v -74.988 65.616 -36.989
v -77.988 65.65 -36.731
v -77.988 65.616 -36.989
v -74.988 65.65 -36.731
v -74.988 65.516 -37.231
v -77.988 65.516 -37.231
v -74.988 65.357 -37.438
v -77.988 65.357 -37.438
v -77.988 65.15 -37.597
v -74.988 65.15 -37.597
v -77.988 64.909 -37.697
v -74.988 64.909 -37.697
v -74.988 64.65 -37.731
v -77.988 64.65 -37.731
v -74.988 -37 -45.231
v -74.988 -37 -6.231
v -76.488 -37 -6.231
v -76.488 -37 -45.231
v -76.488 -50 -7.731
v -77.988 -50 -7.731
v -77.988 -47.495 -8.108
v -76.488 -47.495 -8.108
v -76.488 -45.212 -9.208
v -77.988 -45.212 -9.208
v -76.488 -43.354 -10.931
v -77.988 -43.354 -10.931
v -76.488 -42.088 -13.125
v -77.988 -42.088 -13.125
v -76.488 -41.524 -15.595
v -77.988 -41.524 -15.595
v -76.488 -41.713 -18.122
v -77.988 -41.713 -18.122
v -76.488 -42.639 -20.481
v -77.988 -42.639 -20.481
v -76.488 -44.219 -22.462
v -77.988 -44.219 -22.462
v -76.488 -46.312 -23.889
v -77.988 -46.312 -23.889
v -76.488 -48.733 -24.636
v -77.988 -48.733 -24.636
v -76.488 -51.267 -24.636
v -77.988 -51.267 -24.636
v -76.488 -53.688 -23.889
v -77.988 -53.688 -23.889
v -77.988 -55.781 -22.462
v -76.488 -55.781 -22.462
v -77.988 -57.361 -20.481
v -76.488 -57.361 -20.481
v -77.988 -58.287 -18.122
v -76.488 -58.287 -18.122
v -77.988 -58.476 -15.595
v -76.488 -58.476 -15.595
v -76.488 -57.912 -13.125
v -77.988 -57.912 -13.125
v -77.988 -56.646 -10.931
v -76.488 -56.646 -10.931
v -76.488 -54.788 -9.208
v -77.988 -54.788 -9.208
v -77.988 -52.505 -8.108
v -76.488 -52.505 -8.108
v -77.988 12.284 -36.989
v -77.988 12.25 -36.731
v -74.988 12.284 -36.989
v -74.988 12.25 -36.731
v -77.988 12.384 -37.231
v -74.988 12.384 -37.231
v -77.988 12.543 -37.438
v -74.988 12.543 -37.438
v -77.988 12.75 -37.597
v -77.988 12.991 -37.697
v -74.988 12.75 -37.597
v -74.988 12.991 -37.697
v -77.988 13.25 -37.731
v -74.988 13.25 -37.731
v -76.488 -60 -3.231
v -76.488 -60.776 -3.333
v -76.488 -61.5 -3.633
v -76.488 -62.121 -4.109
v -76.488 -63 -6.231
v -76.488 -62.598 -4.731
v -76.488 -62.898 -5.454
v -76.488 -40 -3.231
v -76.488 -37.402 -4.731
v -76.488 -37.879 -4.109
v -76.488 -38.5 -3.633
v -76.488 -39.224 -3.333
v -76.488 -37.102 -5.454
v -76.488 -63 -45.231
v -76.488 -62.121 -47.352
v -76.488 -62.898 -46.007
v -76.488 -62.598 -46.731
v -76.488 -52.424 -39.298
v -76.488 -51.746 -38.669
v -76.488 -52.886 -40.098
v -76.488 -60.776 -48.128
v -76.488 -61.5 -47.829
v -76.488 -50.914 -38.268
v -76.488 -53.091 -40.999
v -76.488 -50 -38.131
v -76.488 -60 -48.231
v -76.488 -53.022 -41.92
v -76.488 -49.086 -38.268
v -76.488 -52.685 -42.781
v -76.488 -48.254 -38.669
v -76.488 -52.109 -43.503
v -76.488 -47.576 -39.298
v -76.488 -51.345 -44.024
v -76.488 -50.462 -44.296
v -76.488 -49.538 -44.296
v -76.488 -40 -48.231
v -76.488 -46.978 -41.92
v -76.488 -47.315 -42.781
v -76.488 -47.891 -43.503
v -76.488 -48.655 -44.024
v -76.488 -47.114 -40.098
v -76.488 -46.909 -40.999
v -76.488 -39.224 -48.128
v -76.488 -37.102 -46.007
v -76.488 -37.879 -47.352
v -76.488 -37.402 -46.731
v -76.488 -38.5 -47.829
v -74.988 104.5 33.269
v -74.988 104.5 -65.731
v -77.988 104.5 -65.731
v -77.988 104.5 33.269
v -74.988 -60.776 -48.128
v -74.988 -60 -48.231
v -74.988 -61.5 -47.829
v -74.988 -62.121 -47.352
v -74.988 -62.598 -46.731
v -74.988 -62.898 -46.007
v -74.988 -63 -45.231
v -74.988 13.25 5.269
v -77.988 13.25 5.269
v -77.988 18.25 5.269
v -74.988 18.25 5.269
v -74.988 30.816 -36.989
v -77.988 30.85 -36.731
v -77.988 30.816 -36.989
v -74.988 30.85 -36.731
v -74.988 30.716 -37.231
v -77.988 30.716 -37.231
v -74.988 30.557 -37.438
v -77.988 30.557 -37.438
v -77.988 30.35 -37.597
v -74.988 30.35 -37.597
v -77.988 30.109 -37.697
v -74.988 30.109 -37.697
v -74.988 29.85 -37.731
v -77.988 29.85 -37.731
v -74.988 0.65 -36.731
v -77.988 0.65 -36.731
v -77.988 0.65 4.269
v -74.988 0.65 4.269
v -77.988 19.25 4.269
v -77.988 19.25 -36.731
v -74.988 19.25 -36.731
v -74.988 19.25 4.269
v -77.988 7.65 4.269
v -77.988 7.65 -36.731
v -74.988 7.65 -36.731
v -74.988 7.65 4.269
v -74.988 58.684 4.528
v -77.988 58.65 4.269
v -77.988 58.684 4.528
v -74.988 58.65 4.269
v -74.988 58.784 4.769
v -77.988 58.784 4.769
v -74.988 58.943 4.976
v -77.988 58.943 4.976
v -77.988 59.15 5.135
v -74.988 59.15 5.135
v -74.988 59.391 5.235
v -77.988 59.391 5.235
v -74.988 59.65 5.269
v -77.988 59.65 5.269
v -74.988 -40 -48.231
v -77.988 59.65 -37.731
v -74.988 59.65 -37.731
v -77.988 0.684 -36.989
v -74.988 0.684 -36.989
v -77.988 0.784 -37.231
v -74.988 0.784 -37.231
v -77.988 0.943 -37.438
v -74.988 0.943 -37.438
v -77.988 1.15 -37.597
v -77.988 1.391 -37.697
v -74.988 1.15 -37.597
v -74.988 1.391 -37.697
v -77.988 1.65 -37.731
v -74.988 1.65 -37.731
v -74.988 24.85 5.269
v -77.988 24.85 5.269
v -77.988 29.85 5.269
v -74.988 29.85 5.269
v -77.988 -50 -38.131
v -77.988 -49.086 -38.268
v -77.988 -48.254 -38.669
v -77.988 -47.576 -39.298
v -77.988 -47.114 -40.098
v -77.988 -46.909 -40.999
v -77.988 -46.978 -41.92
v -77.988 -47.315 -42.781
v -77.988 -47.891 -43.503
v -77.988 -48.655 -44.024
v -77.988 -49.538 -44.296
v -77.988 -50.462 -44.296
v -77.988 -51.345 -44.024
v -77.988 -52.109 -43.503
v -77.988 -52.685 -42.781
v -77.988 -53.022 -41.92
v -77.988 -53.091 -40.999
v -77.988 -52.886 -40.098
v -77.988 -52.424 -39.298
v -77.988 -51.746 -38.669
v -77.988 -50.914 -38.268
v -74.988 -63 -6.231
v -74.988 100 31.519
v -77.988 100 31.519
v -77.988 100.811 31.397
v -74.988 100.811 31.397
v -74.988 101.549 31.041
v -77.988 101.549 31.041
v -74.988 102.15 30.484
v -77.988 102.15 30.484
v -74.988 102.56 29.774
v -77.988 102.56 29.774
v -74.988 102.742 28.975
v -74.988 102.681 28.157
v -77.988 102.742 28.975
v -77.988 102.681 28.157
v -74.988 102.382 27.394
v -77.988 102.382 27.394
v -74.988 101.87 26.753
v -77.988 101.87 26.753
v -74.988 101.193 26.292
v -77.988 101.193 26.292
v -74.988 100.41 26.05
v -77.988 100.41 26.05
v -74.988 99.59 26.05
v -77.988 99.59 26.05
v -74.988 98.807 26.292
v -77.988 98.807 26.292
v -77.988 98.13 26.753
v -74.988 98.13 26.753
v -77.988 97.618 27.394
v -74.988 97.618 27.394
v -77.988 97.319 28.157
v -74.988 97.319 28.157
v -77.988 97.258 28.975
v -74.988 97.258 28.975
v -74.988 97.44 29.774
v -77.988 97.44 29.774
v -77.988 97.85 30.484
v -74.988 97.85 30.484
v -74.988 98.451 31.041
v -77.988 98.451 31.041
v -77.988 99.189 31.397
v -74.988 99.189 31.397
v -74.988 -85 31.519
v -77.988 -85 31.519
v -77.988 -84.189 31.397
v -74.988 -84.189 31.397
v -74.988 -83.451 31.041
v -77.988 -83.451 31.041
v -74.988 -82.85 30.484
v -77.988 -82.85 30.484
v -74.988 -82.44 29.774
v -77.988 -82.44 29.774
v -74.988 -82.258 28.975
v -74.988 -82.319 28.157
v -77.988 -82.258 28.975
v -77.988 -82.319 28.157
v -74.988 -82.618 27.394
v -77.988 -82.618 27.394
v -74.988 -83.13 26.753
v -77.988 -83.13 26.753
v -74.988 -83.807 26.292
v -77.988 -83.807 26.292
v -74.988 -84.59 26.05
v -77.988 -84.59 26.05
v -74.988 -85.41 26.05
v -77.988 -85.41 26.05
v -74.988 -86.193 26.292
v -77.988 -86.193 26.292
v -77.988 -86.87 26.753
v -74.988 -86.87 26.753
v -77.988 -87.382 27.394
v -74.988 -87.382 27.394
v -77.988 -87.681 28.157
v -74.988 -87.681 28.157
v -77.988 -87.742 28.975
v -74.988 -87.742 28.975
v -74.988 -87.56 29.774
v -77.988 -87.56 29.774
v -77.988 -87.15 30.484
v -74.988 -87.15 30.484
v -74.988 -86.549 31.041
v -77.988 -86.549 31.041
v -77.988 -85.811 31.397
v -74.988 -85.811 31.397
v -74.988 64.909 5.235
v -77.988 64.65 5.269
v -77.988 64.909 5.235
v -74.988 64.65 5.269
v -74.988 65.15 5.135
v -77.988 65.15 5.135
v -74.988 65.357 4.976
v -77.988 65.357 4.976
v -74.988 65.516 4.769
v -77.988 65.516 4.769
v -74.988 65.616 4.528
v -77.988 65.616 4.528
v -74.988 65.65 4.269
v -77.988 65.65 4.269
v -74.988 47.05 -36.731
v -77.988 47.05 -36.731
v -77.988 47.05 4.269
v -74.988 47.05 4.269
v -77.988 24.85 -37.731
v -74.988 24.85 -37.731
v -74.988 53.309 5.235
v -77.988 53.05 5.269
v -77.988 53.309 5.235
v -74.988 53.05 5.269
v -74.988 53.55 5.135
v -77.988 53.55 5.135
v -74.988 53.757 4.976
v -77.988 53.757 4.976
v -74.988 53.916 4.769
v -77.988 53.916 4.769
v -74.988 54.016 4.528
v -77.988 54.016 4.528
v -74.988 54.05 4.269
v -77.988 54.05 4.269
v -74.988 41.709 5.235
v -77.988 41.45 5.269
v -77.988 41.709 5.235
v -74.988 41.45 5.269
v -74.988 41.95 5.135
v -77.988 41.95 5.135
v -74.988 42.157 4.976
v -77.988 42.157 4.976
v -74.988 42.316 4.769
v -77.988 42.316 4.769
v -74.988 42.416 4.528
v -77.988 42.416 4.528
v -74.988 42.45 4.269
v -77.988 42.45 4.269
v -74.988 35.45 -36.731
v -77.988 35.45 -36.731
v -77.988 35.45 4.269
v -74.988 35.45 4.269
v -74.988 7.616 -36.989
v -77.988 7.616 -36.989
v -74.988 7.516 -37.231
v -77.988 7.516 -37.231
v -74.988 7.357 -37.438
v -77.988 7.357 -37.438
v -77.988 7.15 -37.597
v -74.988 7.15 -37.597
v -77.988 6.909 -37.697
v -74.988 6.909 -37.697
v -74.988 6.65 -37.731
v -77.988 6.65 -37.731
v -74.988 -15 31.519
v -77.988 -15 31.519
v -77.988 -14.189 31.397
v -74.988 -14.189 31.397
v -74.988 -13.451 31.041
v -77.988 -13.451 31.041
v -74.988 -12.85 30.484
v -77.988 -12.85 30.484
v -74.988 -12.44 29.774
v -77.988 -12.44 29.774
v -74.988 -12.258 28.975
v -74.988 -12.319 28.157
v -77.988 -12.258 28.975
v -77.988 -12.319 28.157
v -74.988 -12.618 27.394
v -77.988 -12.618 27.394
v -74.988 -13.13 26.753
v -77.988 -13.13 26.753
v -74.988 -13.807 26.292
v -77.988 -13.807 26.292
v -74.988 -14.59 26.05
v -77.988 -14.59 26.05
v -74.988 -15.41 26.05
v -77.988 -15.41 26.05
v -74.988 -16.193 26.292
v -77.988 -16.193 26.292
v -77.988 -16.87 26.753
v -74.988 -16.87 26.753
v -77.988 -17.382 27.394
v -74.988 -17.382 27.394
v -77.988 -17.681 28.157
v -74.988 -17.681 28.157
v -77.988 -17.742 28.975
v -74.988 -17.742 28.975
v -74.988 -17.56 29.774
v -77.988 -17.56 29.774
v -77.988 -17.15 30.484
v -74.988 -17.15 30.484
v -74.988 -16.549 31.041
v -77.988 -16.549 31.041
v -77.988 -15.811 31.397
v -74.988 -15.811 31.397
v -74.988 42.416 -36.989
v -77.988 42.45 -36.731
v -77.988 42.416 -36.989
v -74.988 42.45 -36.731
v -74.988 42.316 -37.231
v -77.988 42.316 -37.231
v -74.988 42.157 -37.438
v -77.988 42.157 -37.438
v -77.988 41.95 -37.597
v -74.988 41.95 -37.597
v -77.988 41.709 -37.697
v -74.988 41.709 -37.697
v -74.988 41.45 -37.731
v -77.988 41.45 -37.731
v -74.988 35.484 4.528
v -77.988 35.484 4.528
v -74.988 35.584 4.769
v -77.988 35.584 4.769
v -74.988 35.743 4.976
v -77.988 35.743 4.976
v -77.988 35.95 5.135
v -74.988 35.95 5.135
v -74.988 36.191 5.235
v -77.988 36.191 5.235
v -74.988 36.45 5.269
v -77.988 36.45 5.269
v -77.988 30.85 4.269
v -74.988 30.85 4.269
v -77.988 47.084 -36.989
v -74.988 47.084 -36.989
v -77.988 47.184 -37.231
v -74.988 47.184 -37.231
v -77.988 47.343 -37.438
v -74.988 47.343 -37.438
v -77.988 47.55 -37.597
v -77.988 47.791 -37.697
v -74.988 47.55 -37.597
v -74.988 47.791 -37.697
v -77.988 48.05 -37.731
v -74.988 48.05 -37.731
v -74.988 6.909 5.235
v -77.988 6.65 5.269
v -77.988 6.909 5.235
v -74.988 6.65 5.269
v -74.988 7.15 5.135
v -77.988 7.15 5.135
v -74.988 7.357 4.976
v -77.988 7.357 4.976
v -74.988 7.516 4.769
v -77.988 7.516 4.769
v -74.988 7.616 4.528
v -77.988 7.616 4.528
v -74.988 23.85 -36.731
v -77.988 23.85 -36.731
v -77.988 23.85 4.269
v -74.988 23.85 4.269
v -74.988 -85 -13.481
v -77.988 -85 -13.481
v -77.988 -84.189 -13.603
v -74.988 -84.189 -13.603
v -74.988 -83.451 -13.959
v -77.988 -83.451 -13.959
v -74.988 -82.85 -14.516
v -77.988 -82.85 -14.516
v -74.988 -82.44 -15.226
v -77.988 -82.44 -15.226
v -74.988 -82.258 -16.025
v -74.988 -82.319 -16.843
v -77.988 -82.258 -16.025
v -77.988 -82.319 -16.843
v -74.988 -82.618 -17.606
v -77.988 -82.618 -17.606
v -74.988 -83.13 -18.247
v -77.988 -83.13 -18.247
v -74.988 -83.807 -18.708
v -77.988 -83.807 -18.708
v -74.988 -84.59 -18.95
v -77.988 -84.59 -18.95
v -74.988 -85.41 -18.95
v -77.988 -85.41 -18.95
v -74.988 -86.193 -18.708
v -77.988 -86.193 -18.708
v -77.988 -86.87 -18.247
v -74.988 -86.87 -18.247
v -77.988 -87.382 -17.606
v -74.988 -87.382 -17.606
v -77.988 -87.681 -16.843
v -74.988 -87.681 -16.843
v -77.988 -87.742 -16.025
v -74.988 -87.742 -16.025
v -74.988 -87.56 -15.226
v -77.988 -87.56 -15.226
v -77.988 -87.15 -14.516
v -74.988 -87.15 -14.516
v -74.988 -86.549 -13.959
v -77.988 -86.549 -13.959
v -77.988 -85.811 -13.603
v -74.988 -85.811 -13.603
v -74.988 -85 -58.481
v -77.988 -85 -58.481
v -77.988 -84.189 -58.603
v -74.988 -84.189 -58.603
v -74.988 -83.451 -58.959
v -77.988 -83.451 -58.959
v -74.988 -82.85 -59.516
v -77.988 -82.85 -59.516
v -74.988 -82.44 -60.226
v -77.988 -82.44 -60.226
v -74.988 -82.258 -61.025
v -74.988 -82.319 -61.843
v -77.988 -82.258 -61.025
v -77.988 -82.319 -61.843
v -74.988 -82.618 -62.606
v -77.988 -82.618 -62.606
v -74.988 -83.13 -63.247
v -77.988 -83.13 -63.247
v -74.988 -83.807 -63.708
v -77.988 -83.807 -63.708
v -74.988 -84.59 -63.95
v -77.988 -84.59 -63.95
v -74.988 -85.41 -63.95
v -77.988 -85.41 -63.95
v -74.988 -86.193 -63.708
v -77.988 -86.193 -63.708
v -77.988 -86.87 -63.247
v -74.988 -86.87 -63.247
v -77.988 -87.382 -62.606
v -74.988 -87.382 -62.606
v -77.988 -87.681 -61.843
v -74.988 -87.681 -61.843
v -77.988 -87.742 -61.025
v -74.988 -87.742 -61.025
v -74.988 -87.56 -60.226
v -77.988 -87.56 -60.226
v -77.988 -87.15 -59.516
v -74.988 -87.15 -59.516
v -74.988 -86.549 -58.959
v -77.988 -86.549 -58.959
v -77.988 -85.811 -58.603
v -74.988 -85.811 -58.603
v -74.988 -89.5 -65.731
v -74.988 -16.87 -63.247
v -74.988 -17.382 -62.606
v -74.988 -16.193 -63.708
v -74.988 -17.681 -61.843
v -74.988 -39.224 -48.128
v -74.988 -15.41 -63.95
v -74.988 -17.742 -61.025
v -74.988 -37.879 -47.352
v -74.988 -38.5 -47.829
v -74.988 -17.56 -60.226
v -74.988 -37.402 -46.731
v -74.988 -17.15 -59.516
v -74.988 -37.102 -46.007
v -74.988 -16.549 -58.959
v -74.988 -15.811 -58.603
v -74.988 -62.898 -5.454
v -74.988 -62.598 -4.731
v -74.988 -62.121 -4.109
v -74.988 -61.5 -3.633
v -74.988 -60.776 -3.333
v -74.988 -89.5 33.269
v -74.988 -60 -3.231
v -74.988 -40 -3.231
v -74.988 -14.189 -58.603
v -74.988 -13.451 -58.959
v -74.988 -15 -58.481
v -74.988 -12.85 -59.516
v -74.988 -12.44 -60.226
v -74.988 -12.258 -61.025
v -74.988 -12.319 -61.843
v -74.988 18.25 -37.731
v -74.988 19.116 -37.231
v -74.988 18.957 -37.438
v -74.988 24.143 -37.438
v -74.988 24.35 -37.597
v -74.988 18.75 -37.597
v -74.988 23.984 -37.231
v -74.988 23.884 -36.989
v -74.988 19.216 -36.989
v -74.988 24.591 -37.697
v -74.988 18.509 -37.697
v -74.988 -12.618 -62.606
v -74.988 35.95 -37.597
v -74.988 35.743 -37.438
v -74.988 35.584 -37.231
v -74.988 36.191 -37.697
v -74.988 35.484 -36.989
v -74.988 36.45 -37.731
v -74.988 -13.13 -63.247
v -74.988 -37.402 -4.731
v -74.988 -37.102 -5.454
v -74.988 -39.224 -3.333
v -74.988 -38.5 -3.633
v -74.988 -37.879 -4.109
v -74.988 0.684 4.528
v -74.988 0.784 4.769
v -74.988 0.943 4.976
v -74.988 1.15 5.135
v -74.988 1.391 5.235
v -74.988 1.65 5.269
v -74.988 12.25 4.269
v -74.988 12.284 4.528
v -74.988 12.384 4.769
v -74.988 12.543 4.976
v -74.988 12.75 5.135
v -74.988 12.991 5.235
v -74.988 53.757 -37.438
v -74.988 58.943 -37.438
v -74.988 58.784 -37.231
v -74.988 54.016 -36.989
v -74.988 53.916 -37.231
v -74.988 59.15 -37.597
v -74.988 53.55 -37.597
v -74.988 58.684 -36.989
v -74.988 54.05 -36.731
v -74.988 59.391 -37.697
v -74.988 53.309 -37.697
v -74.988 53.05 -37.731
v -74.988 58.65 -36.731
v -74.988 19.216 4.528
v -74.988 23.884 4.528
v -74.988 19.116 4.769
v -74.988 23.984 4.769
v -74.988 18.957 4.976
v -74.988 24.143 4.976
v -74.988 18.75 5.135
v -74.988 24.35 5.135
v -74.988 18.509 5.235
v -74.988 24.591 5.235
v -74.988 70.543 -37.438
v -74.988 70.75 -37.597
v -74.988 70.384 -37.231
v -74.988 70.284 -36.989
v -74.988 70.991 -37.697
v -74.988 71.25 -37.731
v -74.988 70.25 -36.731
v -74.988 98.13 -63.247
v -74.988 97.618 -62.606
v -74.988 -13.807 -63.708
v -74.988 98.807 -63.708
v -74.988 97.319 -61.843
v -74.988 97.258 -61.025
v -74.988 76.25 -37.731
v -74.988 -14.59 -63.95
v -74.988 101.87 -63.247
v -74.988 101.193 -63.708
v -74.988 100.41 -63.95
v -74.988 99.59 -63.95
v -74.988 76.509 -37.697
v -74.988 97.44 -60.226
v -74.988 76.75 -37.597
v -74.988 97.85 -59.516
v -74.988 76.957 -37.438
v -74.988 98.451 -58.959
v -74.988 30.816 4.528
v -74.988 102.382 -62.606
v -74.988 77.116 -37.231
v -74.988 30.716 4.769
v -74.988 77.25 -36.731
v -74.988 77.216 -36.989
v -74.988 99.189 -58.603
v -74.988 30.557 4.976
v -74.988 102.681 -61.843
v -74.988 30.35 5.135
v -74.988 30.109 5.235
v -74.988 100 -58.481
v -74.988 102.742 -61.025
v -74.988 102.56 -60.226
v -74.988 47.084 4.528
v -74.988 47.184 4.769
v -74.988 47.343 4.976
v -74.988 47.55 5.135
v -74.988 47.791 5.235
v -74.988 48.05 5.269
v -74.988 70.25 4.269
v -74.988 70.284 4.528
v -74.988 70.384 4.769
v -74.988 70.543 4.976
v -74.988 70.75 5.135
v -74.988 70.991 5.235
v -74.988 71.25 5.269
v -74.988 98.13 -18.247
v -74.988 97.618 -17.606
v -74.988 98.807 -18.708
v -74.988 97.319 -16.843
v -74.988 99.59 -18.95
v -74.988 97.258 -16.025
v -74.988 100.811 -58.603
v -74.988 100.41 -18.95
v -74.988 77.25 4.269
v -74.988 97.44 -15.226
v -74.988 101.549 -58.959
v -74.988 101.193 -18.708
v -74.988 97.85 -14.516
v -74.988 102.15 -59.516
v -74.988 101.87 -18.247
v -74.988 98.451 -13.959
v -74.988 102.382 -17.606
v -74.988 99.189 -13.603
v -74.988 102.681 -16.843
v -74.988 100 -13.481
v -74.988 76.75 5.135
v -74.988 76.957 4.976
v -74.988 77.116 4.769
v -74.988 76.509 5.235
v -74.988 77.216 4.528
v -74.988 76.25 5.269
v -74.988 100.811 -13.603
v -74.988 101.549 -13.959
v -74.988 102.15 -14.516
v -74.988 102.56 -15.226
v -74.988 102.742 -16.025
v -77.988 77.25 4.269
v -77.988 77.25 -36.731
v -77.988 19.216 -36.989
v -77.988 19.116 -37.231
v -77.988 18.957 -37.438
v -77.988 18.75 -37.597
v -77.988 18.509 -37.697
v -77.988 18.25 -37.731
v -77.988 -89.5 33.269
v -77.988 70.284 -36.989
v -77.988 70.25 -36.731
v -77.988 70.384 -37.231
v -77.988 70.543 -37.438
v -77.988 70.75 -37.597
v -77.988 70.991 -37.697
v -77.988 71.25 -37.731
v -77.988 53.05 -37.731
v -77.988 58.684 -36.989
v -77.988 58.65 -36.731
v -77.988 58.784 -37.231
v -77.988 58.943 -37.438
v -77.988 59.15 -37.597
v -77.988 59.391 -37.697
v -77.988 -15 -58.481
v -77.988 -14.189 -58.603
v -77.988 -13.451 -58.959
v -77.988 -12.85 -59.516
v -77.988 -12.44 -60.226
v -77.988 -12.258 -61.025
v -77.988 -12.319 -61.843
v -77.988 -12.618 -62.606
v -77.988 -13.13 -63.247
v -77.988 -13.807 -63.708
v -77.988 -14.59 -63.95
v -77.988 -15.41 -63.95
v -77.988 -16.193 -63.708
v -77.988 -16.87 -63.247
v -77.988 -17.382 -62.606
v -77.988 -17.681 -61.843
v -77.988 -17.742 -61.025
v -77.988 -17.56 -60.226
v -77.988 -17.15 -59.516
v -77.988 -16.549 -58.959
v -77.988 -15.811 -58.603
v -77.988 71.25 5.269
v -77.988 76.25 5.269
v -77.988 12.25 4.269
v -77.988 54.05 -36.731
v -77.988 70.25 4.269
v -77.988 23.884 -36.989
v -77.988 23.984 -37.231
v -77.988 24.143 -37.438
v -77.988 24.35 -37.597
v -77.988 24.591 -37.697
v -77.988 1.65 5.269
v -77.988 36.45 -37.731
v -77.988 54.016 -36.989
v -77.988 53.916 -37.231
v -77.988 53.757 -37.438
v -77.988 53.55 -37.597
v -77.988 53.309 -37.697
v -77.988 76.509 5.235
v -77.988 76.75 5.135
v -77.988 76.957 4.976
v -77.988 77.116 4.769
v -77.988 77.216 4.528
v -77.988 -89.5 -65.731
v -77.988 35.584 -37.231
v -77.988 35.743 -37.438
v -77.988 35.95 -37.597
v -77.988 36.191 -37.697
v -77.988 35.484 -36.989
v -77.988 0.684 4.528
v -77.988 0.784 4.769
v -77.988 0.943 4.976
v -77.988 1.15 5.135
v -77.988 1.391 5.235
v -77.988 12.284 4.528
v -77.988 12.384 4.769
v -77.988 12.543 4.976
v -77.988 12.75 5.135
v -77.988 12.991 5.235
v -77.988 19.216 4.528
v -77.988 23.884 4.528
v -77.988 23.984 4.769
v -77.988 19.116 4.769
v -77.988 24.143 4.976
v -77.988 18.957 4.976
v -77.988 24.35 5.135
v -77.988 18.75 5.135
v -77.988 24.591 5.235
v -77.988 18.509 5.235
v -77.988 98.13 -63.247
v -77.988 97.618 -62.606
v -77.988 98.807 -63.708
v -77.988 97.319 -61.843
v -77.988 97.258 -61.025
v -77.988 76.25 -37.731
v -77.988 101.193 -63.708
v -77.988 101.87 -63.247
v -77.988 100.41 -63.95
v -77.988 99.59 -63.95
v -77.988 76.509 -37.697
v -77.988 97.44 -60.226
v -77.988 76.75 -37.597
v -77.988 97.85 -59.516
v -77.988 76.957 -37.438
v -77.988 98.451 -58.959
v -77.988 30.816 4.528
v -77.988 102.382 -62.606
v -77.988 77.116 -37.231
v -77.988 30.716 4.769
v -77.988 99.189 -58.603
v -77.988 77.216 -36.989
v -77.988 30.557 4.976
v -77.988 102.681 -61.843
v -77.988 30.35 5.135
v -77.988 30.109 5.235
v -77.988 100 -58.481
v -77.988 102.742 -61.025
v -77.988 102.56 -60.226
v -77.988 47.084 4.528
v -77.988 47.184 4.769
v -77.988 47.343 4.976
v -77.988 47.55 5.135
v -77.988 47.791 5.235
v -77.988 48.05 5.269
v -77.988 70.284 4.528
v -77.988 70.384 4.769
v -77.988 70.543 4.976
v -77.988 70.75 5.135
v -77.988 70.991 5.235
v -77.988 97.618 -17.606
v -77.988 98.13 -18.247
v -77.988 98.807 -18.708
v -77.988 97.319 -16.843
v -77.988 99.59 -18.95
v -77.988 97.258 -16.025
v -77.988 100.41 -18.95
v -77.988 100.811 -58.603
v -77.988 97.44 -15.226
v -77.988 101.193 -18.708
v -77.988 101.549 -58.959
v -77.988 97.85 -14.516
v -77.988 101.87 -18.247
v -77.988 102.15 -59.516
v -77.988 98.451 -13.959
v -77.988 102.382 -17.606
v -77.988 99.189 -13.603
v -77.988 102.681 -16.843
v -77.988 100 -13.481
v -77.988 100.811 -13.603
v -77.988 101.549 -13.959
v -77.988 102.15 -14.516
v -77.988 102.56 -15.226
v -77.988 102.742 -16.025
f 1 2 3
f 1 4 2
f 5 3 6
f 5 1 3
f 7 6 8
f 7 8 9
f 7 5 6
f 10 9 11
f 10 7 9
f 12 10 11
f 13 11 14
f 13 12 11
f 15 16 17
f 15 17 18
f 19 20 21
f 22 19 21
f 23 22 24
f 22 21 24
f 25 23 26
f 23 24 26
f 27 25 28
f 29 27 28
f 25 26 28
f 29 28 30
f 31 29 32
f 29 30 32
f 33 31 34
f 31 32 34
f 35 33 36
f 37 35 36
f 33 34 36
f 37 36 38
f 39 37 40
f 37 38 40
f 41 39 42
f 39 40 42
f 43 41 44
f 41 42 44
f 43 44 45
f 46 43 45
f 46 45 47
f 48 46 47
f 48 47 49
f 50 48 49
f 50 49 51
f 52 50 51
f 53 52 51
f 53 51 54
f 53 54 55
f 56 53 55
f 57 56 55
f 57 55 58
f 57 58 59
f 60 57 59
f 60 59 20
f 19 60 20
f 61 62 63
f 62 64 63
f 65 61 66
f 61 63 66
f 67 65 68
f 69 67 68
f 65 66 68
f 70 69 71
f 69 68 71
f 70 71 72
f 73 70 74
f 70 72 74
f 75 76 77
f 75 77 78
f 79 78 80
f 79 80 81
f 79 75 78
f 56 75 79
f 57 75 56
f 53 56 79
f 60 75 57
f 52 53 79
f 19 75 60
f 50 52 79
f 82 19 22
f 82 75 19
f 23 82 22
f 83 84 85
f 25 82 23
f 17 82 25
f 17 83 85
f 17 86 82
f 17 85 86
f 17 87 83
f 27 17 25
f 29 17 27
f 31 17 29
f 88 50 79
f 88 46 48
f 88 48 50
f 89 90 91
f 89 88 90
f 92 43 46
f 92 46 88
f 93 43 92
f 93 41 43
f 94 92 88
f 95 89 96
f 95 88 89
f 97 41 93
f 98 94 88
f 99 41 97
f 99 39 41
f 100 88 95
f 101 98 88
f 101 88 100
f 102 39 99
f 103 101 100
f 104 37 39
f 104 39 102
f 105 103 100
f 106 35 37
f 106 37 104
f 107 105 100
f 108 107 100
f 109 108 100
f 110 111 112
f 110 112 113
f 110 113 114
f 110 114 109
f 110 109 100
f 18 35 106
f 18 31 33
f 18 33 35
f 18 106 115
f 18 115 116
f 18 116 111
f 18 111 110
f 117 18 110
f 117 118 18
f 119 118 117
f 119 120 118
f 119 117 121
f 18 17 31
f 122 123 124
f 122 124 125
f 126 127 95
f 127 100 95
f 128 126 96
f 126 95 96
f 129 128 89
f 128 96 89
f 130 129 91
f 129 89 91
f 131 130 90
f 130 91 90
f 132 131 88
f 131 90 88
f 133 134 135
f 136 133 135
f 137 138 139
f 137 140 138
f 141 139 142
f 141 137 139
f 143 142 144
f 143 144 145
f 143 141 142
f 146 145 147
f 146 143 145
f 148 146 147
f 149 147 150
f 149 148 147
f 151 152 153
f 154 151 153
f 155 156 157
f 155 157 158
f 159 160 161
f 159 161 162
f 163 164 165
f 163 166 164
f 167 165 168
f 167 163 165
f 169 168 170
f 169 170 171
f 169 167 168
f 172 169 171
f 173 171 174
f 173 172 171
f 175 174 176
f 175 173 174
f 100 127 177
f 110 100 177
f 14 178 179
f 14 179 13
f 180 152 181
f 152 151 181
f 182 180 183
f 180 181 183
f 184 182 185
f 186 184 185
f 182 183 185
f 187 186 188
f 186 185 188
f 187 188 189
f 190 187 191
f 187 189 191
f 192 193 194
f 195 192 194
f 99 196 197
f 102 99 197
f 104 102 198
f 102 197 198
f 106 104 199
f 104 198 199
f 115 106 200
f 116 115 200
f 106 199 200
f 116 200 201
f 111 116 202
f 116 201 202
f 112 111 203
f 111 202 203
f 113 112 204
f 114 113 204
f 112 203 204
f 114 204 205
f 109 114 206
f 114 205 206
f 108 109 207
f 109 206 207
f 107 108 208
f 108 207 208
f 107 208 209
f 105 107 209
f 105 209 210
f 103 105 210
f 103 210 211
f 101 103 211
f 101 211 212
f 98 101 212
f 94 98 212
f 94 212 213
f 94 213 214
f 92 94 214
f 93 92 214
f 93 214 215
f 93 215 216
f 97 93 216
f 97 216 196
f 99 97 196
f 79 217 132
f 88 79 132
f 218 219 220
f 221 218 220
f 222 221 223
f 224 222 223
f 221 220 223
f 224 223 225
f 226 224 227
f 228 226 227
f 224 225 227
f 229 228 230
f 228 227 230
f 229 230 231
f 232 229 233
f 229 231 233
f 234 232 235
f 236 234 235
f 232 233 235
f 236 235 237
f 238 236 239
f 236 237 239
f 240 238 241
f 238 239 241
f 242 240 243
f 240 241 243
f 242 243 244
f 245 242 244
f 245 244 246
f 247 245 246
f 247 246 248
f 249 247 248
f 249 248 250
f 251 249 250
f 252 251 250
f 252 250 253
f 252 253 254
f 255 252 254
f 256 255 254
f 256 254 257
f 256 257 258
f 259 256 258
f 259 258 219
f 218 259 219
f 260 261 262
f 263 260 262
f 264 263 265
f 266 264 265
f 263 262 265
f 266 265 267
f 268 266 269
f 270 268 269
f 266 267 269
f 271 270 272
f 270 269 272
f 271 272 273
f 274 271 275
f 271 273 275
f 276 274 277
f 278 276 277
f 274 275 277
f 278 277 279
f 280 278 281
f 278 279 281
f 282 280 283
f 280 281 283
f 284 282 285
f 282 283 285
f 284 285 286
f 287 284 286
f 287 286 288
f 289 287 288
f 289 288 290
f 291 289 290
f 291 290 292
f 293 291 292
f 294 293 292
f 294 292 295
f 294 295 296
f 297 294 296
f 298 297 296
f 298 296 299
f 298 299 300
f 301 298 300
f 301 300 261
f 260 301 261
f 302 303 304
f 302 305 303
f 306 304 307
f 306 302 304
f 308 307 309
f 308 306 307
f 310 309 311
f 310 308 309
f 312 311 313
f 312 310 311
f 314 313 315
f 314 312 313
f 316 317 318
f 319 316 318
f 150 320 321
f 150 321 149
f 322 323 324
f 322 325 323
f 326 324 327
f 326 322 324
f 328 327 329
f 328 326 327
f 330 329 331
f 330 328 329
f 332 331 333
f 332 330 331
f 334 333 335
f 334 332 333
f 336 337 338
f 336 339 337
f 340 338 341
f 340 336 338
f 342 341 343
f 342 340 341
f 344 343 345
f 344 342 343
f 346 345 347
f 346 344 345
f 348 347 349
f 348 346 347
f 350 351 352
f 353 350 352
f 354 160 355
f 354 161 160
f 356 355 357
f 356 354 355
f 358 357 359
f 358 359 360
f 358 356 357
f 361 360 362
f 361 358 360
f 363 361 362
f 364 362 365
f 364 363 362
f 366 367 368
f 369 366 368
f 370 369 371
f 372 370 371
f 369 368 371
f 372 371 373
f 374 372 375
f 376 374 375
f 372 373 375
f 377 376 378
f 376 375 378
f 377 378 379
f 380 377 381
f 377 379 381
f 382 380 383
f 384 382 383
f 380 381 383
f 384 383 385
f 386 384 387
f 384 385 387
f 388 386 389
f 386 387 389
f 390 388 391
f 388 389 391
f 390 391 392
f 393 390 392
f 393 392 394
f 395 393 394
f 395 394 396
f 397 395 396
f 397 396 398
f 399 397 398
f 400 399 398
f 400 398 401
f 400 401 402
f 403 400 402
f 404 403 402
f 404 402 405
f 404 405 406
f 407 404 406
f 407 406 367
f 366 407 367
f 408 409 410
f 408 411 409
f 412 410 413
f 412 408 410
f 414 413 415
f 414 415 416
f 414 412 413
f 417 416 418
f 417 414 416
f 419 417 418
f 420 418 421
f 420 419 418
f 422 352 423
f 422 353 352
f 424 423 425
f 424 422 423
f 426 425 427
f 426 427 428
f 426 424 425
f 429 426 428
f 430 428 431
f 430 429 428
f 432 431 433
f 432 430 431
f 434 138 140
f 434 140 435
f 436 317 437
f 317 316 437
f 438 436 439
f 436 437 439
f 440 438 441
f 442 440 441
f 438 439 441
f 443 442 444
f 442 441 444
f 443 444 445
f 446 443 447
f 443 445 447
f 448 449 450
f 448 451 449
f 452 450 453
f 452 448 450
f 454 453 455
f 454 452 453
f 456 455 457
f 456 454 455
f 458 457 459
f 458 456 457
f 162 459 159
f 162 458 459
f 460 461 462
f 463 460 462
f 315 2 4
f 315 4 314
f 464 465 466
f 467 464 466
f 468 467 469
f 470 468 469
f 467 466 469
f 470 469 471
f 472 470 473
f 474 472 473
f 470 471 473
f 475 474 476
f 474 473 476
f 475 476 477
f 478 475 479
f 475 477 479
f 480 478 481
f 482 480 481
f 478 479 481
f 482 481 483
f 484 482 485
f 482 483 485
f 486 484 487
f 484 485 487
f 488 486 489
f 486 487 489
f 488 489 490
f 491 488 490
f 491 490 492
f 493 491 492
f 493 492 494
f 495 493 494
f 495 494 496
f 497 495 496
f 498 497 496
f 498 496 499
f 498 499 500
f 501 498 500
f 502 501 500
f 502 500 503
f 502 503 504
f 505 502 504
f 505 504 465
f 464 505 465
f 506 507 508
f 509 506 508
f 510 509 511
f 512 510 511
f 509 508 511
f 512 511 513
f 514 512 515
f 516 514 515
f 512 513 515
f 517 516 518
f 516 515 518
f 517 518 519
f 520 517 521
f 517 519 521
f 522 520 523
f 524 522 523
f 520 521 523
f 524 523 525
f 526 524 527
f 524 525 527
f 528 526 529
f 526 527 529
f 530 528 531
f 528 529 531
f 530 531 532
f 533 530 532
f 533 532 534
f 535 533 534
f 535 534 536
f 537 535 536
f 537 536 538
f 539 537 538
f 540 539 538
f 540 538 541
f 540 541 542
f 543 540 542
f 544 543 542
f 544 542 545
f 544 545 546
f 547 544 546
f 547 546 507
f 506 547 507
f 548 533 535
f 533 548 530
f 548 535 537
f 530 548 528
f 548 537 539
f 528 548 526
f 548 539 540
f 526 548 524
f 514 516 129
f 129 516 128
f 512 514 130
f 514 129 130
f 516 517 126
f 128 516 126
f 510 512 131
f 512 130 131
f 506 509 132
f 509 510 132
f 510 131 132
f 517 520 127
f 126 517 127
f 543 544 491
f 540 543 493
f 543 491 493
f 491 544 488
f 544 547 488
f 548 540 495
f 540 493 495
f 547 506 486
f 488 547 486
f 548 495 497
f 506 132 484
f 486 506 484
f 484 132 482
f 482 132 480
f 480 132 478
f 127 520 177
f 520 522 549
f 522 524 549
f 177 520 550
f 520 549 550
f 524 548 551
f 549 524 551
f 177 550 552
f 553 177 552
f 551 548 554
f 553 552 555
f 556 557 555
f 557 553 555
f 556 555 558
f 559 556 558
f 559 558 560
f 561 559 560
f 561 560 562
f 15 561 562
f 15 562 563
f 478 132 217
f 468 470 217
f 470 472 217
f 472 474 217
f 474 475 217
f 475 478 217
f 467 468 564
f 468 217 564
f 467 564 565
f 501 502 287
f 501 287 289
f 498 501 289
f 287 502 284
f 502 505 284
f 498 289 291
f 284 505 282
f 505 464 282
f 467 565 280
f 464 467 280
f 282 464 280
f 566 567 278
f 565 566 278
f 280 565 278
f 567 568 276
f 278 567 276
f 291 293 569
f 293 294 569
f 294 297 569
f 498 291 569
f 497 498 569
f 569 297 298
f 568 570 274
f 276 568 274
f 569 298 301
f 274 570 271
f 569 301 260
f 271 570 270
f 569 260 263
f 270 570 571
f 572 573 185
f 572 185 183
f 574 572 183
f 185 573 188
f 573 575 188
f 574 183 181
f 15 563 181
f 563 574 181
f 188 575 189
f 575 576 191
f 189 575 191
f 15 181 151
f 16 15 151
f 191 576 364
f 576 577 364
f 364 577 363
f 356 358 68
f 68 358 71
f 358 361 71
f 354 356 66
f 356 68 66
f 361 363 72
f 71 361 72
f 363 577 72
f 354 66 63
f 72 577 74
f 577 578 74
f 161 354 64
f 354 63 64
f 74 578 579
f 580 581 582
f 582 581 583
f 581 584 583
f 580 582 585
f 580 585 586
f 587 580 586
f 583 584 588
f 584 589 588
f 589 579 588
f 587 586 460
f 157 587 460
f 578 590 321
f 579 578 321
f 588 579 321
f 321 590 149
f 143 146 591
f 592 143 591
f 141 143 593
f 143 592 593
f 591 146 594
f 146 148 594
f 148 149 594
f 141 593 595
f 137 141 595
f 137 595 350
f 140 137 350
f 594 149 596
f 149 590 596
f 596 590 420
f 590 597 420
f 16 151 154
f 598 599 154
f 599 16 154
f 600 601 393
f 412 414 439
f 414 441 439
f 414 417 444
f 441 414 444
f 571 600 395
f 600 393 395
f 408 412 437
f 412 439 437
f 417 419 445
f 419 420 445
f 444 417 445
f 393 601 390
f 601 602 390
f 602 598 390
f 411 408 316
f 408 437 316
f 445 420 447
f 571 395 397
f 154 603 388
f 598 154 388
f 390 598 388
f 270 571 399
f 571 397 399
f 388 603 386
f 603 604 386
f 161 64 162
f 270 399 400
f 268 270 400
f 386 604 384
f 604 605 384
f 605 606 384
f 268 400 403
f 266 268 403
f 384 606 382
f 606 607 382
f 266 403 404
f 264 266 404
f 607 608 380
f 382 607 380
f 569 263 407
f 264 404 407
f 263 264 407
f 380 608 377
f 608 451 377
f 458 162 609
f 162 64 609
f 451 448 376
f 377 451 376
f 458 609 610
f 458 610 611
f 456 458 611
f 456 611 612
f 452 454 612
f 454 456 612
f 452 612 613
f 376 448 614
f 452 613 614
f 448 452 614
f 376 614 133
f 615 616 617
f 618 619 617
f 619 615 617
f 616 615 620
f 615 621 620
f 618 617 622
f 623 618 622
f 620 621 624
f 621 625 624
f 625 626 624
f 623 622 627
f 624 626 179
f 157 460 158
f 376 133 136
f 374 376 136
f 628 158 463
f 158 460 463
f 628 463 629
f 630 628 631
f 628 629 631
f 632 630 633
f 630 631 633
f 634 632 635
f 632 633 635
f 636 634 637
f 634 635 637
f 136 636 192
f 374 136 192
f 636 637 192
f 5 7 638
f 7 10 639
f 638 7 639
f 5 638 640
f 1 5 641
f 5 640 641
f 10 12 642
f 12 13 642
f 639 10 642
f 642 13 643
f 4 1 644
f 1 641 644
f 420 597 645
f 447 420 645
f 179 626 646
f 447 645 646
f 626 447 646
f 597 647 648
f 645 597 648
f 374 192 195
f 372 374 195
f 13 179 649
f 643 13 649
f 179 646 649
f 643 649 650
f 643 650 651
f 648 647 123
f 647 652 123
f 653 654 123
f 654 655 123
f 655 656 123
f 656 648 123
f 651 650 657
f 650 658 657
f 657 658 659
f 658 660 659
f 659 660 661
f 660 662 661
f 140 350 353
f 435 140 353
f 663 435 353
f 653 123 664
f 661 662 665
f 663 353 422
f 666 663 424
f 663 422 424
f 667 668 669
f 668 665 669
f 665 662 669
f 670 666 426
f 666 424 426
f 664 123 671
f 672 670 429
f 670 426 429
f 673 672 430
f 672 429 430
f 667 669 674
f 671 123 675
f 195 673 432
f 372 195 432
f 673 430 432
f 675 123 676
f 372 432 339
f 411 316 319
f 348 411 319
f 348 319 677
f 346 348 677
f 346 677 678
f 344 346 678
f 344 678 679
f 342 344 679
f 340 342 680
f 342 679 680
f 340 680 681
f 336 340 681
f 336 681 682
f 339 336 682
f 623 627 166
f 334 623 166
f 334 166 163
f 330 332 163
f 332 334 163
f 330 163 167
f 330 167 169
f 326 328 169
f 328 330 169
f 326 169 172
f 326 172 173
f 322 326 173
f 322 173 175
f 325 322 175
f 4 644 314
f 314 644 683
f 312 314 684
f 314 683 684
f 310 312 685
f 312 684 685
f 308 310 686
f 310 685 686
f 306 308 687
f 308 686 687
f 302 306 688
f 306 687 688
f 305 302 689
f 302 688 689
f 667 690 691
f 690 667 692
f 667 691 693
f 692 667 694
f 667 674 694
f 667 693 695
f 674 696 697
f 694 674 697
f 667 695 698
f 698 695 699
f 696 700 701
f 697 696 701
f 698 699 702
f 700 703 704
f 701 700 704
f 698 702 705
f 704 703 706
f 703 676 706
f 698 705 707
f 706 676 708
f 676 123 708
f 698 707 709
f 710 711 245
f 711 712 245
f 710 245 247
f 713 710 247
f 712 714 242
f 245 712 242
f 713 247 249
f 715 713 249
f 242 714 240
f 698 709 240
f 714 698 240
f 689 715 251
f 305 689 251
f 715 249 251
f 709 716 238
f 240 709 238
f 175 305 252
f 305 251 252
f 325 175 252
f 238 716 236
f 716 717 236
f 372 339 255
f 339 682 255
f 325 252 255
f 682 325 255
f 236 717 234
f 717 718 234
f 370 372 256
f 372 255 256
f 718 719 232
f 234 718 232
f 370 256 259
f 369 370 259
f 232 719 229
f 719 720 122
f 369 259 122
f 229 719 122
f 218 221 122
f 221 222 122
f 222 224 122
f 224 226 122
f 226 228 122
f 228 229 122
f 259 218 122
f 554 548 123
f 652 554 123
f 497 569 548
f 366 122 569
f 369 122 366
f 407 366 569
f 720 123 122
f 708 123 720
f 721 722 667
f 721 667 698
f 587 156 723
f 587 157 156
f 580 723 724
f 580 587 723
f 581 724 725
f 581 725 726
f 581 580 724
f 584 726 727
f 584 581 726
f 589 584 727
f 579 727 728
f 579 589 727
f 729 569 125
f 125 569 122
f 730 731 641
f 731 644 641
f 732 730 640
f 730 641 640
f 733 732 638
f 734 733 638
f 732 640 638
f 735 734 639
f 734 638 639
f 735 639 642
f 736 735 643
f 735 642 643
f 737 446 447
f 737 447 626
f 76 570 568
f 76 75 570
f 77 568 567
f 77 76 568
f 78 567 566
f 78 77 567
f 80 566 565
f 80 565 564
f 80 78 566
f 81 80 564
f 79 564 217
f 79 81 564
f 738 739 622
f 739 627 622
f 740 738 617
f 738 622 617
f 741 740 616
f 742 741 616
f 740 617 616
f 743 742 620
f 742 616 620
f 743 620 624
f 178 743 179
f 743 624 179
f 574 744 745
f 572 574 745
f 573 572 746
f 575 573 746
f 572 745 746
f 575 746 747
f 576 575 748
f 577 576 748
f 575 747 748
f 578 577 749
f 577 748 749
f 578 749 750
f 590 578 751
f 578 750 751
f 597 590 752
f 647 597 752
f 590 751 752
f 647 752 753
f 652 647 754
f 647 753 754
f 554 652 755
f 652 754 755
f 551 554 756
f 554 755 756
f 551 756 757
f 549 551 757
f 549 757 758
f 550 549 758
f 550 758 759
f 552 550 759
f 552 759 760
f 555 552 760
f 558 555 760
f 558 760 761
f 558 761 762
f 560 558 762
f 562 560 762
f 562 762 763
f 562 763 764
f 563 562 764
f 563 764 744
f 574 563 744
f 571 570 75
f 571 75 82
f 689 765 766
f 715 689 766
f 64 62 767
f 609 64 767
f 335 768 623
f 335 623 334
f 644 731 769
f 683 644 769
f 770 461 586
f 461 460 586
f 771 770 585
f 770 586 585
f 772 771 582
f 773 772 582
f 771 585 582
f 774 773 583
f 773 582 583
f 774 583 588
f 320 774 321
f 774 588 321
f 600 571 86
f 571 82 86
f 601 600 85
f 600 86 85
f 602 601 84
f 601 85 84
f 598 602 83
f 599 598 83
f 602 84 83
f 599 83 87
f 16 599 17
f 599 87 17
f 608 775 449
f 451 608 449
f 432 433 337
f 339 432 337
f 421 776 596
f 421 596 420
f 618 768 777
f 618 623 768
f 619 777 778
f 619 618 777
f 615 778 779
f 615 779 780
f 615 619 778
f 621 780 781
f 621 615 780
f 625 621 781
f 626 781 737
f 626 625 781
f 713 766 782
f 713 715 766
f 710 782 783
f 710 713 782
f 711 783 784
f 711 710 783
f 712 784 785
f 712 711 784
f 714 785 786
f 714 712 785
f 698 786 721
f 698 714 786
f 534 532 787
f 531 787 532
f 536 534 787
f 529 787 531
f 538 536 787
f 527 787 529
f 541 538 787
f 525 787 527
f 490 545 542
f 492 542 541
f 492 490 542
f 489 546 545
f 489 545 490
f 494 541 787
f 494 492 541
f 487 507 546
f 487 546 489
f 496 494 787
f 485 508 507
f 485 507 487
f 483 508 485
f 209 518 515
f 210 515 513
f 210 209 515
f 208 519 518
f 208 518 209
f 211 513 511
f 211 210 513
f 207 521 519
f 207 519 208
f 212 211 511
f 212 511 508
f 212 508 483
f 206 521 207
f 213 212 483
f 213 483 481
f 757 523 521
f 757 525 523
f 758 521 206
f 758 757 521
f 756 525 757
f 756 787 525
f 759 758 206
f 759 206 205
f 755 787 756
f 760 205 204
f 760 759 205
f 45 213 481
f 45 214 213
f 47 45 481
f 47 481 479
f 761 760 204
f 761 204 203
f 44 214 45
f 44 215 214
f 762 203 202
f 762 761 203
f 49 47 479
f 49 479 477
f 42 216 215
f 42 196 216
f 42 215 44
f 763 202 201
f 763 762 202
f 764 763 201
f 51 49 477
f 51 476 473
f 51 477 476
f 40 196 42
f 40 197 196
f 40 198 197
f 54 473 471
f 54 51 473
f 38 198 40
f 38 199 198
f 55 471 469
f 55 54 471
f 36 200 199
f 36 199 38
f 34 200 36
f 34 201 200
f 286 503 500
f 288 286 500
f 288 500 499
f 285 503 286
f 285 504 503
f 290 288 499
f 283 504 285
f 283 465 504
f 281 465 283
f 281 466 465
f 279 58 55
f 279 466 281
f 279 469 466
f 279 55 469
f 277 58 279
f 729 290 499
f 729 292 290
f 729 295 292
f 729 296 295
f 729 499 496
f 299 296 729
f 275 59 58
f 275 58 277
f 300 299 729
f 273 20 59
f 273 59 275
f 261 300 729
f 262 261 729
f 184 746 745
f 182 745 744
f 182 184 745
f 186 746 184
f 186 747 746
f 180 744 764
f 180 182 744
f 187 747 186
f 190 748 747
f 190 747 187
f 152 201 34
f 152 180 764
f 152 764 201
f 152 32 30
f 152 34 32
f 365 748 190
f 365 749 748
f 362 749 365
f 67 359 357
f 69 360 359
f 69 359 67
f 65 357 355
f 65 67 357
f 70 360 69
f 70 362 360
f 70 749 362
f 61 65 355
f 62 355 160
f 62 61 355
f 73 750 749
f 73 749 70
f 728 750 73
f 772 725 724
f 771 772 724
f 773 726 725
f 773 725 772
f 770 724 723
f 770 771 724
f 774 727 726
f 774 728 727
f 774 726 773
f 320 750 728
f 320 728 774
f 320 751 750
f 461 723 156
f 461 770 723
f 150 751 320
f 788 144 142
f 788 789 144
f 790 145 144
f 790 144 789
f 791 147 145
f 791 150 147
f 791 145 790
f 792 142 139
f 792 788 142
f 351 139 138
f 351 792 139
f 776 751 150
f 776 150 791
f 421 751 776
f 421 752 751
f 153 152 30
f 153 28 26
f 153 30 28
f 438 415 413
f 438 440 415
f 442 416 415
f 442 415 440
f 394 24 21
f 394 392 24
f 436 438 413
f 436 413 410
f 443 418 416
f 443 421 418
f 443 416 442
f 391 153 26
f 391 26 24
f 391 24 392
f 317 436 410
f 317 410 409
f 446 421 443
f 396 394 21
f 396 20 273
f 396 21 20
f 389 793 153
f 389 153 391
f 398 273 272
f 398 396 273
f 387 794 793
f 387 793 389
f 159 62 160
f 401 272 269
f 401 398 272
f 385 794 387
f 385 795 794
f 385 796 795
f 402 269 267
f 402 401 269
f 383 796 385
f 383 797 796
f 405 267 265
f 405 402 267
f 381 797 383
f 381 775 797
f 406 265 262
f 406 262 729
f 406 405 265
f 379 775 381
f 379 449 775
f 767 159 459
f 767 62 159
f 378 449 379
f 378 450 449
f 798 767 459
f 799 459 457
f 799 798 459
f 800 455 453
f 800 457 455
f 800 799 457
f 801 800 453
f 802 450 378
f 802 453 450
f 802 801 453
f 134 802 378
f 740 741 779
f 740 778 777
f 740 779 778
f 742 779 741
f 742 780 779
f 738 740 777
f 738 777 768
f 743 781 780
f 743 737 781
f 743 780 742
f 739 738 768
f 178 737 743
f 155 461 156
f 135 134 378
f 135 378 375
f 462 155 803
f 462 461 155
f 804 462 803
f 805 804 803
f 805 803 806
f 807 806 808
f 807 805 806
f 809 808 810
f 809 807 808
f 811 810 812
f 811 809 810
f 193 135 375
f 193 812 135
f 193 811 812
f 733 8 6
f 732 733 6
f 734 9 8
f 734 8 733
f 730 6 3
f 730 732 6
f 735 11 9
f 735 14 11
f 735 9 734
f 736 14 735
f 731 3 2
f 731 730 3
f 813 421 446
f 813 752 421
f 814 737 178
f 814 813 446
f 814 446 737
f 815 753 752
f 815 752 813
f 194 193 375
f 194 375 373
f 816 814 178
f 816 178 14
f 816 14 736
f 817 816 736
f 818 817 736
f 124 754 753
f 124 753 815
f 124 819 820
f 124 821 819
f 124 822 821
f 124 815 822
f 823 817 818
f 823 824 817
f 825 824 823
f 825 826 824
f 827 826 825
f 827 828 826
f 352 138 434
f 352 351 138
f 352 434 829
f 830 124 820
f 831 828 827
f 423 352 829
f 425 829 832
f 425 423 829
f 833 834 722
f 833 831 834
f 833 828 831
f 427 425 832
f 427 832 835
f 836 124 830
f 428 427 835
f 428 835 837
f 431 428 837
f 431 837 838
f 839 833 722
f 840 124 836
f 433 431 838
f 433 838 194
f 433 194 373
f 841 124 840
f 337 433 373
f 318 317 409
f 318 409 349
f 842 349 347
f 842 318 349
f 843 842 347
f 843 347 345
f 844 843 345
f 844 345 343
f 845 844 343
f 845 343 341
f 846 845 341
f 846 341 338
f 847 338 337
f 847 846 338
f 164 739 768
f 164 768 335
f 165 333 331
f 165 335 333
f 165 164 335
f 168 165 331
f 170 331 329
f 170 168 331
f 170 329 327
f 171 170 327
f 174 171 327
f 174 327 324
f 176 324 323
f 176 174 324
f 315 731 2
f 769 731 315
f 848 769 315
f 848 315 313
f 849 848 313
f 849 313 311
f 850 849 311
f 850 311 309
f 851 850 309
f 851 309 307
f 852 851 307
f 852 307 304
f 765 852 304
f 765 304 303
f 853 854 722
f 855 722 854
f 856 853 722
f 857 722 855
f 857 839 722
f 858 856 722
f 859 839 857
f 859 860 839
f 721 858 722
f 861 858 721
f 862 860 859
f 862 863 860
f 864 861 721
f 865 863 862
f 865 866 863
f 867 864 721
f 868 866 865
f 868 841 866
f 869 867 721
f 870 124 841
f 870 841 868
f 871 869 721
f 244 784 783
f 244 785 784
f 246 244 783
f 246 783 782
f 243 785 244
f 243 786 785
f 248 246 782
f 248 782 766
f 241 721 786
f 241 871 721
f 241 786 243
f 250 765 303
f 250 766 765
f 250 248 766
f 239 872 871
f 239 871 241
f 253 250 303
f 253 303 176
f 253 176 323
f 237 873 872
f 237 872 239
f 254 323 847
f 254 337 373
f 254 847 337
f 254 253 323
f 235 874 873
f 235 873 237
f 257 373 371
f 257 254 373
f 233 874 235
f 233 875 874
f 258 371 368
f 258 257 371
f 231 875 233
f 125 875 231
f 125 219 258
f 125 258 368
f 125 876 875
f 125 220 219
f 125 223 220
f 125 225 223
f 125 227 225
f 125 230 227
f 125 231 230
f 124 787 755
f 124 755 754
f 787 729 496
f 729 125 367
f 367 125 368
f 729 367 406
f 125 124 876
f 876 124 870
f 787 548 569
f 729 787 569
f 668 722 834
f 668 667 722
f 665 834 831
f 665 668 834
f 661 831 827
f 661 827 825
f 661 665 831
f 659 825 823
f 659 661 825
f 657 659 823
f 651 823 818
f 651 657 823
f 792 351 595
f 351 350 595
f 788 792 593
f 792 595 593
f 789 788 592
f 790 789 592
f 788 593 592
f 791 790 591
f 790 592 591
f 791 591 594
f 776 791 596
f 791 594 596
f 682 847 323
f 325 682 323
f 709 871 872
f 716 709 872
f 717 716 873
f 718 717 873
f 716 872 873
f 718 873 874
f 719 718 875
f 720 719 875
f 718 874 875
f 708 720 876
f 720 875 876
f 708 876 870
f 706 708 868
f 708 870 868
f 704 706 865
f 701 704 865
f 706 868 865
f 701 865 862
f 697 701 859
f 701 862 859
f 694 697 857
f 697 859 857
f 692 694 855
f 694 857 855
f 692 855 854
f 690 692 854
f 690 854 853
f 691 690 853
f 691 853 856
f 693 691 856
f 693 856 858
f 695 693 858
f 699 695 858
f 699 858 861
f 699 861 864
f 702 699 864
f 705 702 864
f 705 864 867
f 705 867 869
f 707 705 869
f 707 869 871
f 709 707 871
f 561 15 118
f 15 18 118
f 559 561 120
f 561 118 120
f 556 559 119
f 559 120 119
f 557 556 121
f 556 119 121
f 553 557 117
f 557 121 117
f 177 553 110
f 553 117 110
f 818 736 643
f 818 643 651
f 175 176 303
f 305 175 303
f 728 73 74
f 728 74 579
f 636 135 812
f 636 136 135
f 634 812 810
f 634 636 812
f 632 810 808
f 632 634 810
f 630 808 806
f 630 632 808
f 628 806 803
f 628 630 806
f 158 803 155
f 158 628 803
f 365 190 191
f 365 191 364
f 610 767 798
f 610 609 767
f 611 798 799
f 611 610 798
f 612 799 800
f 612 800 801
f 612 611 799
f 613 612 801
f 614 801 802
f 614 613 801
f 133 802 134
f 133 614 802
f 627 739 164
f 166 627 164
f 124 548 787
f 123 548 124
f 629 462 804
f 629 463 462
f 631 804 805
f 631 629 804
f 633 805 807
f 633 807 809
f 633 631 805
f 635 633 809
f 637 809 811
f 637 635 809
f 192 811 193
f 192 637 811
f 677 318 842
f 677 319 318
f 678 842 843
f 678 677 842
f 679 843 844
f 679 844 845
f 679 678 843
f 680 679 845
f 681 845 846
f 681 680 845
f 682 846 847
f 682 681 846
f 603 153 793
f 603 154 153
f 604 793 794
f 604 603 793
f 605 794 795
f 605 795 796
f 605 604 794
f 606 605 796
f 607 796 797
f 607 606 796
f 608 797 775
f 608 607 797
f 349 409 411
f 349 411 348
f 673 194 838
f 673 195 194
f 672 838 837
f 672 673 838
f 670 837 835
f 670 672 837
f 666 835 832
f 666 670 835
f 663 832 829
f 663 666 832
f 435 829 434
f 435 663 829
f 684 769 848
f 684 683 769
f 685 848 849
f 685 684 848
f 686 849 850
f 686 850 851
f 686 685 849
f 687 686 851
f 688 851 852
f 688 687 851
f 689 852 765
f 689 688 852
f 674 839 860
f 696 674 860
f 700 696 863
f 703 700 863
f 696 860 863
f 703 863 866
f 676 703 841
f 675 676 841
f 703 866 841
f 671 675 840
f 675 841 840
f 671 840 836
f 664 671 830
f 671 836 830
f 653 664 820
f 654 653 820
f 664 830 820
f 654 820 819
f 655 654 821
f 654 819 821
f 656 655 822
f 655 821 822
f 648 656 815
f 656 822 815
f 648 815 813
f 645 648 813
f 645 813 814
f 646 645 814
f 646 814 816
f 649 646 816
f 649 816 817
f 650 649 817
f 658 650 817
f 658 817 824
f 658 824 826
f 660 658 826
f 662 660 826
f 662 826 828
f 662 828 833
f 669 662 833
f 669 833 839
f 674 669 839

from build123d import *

# Parameters (mm, degrees)
SKETCH1_W           = 99
SKETCH1_H           = 194
BOSS_EXTRUDE1_DEPTH = 3
SKETCH2_W           = 43
SKETCH2_H           = 7
CUT_EXTRUDE1_DEPTH  = 4
FILLET1_R           = 1
SKETCH3_R           = 8.5
SKETCH3_R_2         = 3.1
CUT_EXTRUDE2_DEPTH  = 4
SKETCH4_W           = 45
SKETCH4_H           = 26
CUT_EXTRUDE3_DEPTH  = 1.5
FILLET2_R           = 3
SKETCH5_R           = 2.75
CUT_EXTRUDE4_DEPTH  = 4


with BuildPart() as part:
    # Sketch1 → Boss-Extrude1 (new body)
    with BuildSketch(Plane.ZY.offset(74.98828393)):
        with Locations((-16.230657269, 7.5)):
            Rectangle(SKETCH1_W, SKETCH1_H)
    extrude(amount=BOSS_EXTRUDE1_DEPTH)

    # Sketch2 → Cut-Extrude1 (cut, through all)
    with BuildSketch(Plane.ZY.offset(77.98828393)):
        with Locations((-16.230657269, 73.75)):
            Rectangle(SKETCH2_W, SKETCH2_H)
        with Locations((-16.230657269, 62.15)):
            Rectangle(SKETCH2_W, SKETCH2_H)
        with Locations((-16.230657269, 50.55)):
            Rectangle(SKETCH2_W, SKETCH2_H)
        with Locations((-16.230657269, 38.95)):
            Rectangle(SKETCH2_W, SKETCH2_H)
        with Locations((-16.230657269, 27.35)):
            Rectangle(SKETCH2_W, SKETCH2_H)
        with Locations((-16.230657269, 15.75)):
            Rectangle(SKETCH2_W, SKETCH2_H)
        with Locations((-16.230657269, 4.15)):
            Rectangle(SKETCH2_W, SKETCH2_H)
    extrude(amount=-CUT_EXTRUDE1_DEPTH, mode=Mode.SUBTRACT)

    # Fillet1
    fillet1_edges = [part.edges().sort_by_distance(p)[0] for p in [
        (-76.48828393, 77.25, 5.269342731),
        (-76.48828393, 70.25, 5.269342731),
        (-76.48828393, 70.25, -37.730657269),
        (-76.48828393, 77.25, -37.730657269),
        (-76.48828393, 65.65, 5.269342731),
        (-76.48828393, 58.65, 5.269342731),
        (-76.48828393, 58.65, -37.730657269),
        (-76.48828393, 65.65, -37.730657269),
        (-76.48828393, 54.05, 5.269342731),
        (-76.48828393, 47.05, 5.269342731),
        (-76.48828393, 47.05, -37.730657269),
        (-76.48828393, 54.05, -37.730657269),
        (-76.48828393, 42.45, 5.269342731),
        (-76.48828393, 35.45, 5.269342731),
        (-76.48828393, 35.45, -37.730657269),
        (-76.48828393, 42.45, -37.730657269),
        (-76.48828393, 30.85, 5.269342731),
        (-76.48828393, 23.85, 5.269342731),
        (-76.48828393, 23.85, -37.730657269),
        (-76.48828393, 30.85, -37.730657269),
        (-76.48828393, 19.25, 5.269342731),
        (-76.48828393, 12.25, 5.269342731),
        (-76.48828393, 12.25, -37.730657269),
        (-76.48828393, 19.25, -37.730657269),
        (-76.48828393, 7.65, 5.269342731),
        (-76.48828393, 0.65, 5.269342731),
        (-76.48828393, 0.65, -37.730657269),
        (-76.48828393, 7.65, -37.730657269),
    ]]
    fillet(fillet1_edges, radius=FILLET1_R)

    # Sketch3 → Cut-Extrude2 (cut, through all)
    with BuildSketch(Plane.ZY.offset(77.98828393)):
        with Locations((-16.230657269, -50)):
            Circle(SKETCH3_R)
        with Locations((-41.230657269, -50)):
            Circle(SKETCH3_R_2)
    extrude(amount=-CUT_EXTRUDE2_DEPTH, mode=Mode.SUBTRACT)

    # Sketch4 → Cut-Extrude3 (cut)
    with BuildSketch(Plane(origin=(-74.98828393, 0, 0), x_dir=(0, 0, -1), z_dir=(1, 0, 0))):
        with Locations((25.730657269, -50)):
            Rectangle(SKETCH4_W, SKETCH4_H)
    extrude(amount=-CUT_EXTRUDE3_DEPTH, mode=Mode.SUBTRACT)

    # Fillet2
    fillet2_edges = [part.edges().sort_by_distance(p)[0] for p in [
        (-75.73828393, -37, -48.230657269),
        (-75.73828393, -63, -48.230657269),
        (-75.73828393, -63, -3.230657269),
        (-75.73828393, -37, -3.230657269),
    ]]
    fillet(fillet2_edges, radius=FILLET2_R)

    # Sketch5 → Cut-Extrude4 (cut, through all)
    with BuildSketch(Plane.ZY.offset(77.98828393)):
        with Locations((-61.230657269, 100)):
            Circle(SKETCH5_R)
        with Locations((28.769342731, 100)):
            Circle(SKETCH5_R)
        with Locations((-61.230657269, -15)):
            Circle(SKETCH5_R)
        with Locations((-61.230657269, -85)):
            Circle(SKETCH5_R)
        with Locations((28.769342731, -85)):
            Circle(SKETCH5_R)
        with Locations((28.769342731, -15)):
            Circle(SKETCH5_R)
        with Locations((-16.230657269, 100)):
            Circle(SKETCH5_R)
        with Locations((-16.230657269, -85)):
            Circle(SKETCH5_R)
    extrude(amount=-CUT_EXTRUDE4_DEPTH, mode=Mode.SUBTRACT)


solid = part.part
